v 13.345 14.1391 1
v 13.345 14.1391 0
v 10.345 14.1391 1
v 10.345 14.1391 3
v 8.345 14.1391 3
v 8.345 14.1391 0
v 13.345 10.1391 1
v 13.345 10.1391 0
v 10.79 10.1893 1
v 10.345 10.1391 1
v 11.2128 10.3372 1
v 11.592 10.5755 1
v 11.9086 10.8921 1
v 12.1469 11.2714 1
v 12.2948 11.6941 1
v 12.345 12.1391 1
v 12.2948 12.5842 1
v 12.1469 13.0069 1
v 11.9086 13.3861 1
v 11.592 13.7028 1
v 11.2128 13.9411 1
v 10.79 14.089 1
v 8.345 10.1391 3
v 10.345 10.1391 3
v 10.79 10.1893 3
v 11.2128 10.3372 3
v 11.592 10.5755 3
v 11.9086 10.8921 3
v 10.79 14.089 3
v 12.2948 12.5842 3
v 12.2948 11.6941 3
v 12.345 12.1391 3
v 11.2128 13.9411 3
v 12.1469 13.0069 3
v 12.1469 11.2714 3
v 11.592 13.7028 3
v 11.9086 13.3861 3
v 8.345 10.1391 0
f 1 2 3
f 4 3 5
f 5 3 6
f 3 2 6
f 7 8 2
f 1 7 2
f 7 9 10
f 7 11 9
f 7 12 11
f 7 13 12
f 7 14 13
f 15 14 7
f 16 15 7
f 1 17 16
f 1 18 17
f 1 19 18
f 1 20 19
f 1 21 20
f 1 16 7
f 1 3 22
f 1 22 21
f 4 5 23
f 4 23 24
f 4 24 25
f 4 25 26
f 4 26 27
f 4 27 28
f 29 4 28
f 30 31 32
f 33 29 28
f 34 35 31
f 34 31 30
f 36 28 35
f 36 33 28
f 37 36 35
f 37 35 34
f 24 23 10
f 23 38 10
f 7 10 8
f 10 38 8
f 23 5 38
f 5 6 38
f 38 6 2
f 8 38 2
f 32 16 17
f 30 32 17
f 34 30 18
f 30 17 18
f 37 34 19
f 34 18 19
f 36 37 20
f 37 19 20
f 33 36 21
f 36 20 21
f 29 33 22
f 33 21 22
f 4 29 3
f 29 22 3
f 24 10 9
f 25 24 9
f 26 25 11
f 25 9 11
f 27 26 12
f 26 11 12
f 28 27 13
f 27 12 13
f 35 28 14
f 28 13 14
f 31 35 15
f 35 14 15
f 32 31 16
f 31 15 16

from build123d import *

# Parameters (mm, degrees)
F0_W     = 5
F0_H     = 4
F1_DEPTH = 1
F3_DEPTH = 2


with BuildPart() as f1:
    # F0 (on Top) → F1 (new body)
    with BuildSketch(Plane.XY):
        with Locations((10.844986, 12.139127)):
            Rectangle(F0_W, F0_H)
    extrude(amount=F1_DEPTH)

    # F2 (on face) → F3 (join)
    with BuildSketch(Plane.XY.offset(1)):
        with BuildLine():
            Line((10.344986, 14.139127), (8.344986, 14.139127))
            Line((8.344986, 14.139127), (8.344986, 12.139127))
            ThreePointArc((8.344986, 12.139127), (8.930772, 13.553341), (10.344986, 14.139127))
        make_face()
        with BuildLine():
            ThreePointArc((10.344986, 10.139127), (8.930772, 10.724914), (8.344986, 12.139127))
            Line((8.344986, 12.139127), (8.344986, 10.139127))
            Line((8.344986, 10.139127), (10.344986, 10.139127))
        make_face()
        with BuildLine():
            ThreePointArc((10.344986, 14.139127), (8.930772, 13.553341), (8.344986, 12.139127))
            ThreePointArc((8.344986, 12.139127), (8.930772, 10.724914), (10.344986, 10.139127))
            ThreePointArc((10.344986, 10.139127), (11.759199, 10.724914), (12.344986, 12.139127))
            ThreePointArc((12.344986, 12.139127), (11.759199, 13.553341), (10.344986, 14.139127))
        make_face()
    extrude(amount=F3_DEPTH)


solid = f1.part
